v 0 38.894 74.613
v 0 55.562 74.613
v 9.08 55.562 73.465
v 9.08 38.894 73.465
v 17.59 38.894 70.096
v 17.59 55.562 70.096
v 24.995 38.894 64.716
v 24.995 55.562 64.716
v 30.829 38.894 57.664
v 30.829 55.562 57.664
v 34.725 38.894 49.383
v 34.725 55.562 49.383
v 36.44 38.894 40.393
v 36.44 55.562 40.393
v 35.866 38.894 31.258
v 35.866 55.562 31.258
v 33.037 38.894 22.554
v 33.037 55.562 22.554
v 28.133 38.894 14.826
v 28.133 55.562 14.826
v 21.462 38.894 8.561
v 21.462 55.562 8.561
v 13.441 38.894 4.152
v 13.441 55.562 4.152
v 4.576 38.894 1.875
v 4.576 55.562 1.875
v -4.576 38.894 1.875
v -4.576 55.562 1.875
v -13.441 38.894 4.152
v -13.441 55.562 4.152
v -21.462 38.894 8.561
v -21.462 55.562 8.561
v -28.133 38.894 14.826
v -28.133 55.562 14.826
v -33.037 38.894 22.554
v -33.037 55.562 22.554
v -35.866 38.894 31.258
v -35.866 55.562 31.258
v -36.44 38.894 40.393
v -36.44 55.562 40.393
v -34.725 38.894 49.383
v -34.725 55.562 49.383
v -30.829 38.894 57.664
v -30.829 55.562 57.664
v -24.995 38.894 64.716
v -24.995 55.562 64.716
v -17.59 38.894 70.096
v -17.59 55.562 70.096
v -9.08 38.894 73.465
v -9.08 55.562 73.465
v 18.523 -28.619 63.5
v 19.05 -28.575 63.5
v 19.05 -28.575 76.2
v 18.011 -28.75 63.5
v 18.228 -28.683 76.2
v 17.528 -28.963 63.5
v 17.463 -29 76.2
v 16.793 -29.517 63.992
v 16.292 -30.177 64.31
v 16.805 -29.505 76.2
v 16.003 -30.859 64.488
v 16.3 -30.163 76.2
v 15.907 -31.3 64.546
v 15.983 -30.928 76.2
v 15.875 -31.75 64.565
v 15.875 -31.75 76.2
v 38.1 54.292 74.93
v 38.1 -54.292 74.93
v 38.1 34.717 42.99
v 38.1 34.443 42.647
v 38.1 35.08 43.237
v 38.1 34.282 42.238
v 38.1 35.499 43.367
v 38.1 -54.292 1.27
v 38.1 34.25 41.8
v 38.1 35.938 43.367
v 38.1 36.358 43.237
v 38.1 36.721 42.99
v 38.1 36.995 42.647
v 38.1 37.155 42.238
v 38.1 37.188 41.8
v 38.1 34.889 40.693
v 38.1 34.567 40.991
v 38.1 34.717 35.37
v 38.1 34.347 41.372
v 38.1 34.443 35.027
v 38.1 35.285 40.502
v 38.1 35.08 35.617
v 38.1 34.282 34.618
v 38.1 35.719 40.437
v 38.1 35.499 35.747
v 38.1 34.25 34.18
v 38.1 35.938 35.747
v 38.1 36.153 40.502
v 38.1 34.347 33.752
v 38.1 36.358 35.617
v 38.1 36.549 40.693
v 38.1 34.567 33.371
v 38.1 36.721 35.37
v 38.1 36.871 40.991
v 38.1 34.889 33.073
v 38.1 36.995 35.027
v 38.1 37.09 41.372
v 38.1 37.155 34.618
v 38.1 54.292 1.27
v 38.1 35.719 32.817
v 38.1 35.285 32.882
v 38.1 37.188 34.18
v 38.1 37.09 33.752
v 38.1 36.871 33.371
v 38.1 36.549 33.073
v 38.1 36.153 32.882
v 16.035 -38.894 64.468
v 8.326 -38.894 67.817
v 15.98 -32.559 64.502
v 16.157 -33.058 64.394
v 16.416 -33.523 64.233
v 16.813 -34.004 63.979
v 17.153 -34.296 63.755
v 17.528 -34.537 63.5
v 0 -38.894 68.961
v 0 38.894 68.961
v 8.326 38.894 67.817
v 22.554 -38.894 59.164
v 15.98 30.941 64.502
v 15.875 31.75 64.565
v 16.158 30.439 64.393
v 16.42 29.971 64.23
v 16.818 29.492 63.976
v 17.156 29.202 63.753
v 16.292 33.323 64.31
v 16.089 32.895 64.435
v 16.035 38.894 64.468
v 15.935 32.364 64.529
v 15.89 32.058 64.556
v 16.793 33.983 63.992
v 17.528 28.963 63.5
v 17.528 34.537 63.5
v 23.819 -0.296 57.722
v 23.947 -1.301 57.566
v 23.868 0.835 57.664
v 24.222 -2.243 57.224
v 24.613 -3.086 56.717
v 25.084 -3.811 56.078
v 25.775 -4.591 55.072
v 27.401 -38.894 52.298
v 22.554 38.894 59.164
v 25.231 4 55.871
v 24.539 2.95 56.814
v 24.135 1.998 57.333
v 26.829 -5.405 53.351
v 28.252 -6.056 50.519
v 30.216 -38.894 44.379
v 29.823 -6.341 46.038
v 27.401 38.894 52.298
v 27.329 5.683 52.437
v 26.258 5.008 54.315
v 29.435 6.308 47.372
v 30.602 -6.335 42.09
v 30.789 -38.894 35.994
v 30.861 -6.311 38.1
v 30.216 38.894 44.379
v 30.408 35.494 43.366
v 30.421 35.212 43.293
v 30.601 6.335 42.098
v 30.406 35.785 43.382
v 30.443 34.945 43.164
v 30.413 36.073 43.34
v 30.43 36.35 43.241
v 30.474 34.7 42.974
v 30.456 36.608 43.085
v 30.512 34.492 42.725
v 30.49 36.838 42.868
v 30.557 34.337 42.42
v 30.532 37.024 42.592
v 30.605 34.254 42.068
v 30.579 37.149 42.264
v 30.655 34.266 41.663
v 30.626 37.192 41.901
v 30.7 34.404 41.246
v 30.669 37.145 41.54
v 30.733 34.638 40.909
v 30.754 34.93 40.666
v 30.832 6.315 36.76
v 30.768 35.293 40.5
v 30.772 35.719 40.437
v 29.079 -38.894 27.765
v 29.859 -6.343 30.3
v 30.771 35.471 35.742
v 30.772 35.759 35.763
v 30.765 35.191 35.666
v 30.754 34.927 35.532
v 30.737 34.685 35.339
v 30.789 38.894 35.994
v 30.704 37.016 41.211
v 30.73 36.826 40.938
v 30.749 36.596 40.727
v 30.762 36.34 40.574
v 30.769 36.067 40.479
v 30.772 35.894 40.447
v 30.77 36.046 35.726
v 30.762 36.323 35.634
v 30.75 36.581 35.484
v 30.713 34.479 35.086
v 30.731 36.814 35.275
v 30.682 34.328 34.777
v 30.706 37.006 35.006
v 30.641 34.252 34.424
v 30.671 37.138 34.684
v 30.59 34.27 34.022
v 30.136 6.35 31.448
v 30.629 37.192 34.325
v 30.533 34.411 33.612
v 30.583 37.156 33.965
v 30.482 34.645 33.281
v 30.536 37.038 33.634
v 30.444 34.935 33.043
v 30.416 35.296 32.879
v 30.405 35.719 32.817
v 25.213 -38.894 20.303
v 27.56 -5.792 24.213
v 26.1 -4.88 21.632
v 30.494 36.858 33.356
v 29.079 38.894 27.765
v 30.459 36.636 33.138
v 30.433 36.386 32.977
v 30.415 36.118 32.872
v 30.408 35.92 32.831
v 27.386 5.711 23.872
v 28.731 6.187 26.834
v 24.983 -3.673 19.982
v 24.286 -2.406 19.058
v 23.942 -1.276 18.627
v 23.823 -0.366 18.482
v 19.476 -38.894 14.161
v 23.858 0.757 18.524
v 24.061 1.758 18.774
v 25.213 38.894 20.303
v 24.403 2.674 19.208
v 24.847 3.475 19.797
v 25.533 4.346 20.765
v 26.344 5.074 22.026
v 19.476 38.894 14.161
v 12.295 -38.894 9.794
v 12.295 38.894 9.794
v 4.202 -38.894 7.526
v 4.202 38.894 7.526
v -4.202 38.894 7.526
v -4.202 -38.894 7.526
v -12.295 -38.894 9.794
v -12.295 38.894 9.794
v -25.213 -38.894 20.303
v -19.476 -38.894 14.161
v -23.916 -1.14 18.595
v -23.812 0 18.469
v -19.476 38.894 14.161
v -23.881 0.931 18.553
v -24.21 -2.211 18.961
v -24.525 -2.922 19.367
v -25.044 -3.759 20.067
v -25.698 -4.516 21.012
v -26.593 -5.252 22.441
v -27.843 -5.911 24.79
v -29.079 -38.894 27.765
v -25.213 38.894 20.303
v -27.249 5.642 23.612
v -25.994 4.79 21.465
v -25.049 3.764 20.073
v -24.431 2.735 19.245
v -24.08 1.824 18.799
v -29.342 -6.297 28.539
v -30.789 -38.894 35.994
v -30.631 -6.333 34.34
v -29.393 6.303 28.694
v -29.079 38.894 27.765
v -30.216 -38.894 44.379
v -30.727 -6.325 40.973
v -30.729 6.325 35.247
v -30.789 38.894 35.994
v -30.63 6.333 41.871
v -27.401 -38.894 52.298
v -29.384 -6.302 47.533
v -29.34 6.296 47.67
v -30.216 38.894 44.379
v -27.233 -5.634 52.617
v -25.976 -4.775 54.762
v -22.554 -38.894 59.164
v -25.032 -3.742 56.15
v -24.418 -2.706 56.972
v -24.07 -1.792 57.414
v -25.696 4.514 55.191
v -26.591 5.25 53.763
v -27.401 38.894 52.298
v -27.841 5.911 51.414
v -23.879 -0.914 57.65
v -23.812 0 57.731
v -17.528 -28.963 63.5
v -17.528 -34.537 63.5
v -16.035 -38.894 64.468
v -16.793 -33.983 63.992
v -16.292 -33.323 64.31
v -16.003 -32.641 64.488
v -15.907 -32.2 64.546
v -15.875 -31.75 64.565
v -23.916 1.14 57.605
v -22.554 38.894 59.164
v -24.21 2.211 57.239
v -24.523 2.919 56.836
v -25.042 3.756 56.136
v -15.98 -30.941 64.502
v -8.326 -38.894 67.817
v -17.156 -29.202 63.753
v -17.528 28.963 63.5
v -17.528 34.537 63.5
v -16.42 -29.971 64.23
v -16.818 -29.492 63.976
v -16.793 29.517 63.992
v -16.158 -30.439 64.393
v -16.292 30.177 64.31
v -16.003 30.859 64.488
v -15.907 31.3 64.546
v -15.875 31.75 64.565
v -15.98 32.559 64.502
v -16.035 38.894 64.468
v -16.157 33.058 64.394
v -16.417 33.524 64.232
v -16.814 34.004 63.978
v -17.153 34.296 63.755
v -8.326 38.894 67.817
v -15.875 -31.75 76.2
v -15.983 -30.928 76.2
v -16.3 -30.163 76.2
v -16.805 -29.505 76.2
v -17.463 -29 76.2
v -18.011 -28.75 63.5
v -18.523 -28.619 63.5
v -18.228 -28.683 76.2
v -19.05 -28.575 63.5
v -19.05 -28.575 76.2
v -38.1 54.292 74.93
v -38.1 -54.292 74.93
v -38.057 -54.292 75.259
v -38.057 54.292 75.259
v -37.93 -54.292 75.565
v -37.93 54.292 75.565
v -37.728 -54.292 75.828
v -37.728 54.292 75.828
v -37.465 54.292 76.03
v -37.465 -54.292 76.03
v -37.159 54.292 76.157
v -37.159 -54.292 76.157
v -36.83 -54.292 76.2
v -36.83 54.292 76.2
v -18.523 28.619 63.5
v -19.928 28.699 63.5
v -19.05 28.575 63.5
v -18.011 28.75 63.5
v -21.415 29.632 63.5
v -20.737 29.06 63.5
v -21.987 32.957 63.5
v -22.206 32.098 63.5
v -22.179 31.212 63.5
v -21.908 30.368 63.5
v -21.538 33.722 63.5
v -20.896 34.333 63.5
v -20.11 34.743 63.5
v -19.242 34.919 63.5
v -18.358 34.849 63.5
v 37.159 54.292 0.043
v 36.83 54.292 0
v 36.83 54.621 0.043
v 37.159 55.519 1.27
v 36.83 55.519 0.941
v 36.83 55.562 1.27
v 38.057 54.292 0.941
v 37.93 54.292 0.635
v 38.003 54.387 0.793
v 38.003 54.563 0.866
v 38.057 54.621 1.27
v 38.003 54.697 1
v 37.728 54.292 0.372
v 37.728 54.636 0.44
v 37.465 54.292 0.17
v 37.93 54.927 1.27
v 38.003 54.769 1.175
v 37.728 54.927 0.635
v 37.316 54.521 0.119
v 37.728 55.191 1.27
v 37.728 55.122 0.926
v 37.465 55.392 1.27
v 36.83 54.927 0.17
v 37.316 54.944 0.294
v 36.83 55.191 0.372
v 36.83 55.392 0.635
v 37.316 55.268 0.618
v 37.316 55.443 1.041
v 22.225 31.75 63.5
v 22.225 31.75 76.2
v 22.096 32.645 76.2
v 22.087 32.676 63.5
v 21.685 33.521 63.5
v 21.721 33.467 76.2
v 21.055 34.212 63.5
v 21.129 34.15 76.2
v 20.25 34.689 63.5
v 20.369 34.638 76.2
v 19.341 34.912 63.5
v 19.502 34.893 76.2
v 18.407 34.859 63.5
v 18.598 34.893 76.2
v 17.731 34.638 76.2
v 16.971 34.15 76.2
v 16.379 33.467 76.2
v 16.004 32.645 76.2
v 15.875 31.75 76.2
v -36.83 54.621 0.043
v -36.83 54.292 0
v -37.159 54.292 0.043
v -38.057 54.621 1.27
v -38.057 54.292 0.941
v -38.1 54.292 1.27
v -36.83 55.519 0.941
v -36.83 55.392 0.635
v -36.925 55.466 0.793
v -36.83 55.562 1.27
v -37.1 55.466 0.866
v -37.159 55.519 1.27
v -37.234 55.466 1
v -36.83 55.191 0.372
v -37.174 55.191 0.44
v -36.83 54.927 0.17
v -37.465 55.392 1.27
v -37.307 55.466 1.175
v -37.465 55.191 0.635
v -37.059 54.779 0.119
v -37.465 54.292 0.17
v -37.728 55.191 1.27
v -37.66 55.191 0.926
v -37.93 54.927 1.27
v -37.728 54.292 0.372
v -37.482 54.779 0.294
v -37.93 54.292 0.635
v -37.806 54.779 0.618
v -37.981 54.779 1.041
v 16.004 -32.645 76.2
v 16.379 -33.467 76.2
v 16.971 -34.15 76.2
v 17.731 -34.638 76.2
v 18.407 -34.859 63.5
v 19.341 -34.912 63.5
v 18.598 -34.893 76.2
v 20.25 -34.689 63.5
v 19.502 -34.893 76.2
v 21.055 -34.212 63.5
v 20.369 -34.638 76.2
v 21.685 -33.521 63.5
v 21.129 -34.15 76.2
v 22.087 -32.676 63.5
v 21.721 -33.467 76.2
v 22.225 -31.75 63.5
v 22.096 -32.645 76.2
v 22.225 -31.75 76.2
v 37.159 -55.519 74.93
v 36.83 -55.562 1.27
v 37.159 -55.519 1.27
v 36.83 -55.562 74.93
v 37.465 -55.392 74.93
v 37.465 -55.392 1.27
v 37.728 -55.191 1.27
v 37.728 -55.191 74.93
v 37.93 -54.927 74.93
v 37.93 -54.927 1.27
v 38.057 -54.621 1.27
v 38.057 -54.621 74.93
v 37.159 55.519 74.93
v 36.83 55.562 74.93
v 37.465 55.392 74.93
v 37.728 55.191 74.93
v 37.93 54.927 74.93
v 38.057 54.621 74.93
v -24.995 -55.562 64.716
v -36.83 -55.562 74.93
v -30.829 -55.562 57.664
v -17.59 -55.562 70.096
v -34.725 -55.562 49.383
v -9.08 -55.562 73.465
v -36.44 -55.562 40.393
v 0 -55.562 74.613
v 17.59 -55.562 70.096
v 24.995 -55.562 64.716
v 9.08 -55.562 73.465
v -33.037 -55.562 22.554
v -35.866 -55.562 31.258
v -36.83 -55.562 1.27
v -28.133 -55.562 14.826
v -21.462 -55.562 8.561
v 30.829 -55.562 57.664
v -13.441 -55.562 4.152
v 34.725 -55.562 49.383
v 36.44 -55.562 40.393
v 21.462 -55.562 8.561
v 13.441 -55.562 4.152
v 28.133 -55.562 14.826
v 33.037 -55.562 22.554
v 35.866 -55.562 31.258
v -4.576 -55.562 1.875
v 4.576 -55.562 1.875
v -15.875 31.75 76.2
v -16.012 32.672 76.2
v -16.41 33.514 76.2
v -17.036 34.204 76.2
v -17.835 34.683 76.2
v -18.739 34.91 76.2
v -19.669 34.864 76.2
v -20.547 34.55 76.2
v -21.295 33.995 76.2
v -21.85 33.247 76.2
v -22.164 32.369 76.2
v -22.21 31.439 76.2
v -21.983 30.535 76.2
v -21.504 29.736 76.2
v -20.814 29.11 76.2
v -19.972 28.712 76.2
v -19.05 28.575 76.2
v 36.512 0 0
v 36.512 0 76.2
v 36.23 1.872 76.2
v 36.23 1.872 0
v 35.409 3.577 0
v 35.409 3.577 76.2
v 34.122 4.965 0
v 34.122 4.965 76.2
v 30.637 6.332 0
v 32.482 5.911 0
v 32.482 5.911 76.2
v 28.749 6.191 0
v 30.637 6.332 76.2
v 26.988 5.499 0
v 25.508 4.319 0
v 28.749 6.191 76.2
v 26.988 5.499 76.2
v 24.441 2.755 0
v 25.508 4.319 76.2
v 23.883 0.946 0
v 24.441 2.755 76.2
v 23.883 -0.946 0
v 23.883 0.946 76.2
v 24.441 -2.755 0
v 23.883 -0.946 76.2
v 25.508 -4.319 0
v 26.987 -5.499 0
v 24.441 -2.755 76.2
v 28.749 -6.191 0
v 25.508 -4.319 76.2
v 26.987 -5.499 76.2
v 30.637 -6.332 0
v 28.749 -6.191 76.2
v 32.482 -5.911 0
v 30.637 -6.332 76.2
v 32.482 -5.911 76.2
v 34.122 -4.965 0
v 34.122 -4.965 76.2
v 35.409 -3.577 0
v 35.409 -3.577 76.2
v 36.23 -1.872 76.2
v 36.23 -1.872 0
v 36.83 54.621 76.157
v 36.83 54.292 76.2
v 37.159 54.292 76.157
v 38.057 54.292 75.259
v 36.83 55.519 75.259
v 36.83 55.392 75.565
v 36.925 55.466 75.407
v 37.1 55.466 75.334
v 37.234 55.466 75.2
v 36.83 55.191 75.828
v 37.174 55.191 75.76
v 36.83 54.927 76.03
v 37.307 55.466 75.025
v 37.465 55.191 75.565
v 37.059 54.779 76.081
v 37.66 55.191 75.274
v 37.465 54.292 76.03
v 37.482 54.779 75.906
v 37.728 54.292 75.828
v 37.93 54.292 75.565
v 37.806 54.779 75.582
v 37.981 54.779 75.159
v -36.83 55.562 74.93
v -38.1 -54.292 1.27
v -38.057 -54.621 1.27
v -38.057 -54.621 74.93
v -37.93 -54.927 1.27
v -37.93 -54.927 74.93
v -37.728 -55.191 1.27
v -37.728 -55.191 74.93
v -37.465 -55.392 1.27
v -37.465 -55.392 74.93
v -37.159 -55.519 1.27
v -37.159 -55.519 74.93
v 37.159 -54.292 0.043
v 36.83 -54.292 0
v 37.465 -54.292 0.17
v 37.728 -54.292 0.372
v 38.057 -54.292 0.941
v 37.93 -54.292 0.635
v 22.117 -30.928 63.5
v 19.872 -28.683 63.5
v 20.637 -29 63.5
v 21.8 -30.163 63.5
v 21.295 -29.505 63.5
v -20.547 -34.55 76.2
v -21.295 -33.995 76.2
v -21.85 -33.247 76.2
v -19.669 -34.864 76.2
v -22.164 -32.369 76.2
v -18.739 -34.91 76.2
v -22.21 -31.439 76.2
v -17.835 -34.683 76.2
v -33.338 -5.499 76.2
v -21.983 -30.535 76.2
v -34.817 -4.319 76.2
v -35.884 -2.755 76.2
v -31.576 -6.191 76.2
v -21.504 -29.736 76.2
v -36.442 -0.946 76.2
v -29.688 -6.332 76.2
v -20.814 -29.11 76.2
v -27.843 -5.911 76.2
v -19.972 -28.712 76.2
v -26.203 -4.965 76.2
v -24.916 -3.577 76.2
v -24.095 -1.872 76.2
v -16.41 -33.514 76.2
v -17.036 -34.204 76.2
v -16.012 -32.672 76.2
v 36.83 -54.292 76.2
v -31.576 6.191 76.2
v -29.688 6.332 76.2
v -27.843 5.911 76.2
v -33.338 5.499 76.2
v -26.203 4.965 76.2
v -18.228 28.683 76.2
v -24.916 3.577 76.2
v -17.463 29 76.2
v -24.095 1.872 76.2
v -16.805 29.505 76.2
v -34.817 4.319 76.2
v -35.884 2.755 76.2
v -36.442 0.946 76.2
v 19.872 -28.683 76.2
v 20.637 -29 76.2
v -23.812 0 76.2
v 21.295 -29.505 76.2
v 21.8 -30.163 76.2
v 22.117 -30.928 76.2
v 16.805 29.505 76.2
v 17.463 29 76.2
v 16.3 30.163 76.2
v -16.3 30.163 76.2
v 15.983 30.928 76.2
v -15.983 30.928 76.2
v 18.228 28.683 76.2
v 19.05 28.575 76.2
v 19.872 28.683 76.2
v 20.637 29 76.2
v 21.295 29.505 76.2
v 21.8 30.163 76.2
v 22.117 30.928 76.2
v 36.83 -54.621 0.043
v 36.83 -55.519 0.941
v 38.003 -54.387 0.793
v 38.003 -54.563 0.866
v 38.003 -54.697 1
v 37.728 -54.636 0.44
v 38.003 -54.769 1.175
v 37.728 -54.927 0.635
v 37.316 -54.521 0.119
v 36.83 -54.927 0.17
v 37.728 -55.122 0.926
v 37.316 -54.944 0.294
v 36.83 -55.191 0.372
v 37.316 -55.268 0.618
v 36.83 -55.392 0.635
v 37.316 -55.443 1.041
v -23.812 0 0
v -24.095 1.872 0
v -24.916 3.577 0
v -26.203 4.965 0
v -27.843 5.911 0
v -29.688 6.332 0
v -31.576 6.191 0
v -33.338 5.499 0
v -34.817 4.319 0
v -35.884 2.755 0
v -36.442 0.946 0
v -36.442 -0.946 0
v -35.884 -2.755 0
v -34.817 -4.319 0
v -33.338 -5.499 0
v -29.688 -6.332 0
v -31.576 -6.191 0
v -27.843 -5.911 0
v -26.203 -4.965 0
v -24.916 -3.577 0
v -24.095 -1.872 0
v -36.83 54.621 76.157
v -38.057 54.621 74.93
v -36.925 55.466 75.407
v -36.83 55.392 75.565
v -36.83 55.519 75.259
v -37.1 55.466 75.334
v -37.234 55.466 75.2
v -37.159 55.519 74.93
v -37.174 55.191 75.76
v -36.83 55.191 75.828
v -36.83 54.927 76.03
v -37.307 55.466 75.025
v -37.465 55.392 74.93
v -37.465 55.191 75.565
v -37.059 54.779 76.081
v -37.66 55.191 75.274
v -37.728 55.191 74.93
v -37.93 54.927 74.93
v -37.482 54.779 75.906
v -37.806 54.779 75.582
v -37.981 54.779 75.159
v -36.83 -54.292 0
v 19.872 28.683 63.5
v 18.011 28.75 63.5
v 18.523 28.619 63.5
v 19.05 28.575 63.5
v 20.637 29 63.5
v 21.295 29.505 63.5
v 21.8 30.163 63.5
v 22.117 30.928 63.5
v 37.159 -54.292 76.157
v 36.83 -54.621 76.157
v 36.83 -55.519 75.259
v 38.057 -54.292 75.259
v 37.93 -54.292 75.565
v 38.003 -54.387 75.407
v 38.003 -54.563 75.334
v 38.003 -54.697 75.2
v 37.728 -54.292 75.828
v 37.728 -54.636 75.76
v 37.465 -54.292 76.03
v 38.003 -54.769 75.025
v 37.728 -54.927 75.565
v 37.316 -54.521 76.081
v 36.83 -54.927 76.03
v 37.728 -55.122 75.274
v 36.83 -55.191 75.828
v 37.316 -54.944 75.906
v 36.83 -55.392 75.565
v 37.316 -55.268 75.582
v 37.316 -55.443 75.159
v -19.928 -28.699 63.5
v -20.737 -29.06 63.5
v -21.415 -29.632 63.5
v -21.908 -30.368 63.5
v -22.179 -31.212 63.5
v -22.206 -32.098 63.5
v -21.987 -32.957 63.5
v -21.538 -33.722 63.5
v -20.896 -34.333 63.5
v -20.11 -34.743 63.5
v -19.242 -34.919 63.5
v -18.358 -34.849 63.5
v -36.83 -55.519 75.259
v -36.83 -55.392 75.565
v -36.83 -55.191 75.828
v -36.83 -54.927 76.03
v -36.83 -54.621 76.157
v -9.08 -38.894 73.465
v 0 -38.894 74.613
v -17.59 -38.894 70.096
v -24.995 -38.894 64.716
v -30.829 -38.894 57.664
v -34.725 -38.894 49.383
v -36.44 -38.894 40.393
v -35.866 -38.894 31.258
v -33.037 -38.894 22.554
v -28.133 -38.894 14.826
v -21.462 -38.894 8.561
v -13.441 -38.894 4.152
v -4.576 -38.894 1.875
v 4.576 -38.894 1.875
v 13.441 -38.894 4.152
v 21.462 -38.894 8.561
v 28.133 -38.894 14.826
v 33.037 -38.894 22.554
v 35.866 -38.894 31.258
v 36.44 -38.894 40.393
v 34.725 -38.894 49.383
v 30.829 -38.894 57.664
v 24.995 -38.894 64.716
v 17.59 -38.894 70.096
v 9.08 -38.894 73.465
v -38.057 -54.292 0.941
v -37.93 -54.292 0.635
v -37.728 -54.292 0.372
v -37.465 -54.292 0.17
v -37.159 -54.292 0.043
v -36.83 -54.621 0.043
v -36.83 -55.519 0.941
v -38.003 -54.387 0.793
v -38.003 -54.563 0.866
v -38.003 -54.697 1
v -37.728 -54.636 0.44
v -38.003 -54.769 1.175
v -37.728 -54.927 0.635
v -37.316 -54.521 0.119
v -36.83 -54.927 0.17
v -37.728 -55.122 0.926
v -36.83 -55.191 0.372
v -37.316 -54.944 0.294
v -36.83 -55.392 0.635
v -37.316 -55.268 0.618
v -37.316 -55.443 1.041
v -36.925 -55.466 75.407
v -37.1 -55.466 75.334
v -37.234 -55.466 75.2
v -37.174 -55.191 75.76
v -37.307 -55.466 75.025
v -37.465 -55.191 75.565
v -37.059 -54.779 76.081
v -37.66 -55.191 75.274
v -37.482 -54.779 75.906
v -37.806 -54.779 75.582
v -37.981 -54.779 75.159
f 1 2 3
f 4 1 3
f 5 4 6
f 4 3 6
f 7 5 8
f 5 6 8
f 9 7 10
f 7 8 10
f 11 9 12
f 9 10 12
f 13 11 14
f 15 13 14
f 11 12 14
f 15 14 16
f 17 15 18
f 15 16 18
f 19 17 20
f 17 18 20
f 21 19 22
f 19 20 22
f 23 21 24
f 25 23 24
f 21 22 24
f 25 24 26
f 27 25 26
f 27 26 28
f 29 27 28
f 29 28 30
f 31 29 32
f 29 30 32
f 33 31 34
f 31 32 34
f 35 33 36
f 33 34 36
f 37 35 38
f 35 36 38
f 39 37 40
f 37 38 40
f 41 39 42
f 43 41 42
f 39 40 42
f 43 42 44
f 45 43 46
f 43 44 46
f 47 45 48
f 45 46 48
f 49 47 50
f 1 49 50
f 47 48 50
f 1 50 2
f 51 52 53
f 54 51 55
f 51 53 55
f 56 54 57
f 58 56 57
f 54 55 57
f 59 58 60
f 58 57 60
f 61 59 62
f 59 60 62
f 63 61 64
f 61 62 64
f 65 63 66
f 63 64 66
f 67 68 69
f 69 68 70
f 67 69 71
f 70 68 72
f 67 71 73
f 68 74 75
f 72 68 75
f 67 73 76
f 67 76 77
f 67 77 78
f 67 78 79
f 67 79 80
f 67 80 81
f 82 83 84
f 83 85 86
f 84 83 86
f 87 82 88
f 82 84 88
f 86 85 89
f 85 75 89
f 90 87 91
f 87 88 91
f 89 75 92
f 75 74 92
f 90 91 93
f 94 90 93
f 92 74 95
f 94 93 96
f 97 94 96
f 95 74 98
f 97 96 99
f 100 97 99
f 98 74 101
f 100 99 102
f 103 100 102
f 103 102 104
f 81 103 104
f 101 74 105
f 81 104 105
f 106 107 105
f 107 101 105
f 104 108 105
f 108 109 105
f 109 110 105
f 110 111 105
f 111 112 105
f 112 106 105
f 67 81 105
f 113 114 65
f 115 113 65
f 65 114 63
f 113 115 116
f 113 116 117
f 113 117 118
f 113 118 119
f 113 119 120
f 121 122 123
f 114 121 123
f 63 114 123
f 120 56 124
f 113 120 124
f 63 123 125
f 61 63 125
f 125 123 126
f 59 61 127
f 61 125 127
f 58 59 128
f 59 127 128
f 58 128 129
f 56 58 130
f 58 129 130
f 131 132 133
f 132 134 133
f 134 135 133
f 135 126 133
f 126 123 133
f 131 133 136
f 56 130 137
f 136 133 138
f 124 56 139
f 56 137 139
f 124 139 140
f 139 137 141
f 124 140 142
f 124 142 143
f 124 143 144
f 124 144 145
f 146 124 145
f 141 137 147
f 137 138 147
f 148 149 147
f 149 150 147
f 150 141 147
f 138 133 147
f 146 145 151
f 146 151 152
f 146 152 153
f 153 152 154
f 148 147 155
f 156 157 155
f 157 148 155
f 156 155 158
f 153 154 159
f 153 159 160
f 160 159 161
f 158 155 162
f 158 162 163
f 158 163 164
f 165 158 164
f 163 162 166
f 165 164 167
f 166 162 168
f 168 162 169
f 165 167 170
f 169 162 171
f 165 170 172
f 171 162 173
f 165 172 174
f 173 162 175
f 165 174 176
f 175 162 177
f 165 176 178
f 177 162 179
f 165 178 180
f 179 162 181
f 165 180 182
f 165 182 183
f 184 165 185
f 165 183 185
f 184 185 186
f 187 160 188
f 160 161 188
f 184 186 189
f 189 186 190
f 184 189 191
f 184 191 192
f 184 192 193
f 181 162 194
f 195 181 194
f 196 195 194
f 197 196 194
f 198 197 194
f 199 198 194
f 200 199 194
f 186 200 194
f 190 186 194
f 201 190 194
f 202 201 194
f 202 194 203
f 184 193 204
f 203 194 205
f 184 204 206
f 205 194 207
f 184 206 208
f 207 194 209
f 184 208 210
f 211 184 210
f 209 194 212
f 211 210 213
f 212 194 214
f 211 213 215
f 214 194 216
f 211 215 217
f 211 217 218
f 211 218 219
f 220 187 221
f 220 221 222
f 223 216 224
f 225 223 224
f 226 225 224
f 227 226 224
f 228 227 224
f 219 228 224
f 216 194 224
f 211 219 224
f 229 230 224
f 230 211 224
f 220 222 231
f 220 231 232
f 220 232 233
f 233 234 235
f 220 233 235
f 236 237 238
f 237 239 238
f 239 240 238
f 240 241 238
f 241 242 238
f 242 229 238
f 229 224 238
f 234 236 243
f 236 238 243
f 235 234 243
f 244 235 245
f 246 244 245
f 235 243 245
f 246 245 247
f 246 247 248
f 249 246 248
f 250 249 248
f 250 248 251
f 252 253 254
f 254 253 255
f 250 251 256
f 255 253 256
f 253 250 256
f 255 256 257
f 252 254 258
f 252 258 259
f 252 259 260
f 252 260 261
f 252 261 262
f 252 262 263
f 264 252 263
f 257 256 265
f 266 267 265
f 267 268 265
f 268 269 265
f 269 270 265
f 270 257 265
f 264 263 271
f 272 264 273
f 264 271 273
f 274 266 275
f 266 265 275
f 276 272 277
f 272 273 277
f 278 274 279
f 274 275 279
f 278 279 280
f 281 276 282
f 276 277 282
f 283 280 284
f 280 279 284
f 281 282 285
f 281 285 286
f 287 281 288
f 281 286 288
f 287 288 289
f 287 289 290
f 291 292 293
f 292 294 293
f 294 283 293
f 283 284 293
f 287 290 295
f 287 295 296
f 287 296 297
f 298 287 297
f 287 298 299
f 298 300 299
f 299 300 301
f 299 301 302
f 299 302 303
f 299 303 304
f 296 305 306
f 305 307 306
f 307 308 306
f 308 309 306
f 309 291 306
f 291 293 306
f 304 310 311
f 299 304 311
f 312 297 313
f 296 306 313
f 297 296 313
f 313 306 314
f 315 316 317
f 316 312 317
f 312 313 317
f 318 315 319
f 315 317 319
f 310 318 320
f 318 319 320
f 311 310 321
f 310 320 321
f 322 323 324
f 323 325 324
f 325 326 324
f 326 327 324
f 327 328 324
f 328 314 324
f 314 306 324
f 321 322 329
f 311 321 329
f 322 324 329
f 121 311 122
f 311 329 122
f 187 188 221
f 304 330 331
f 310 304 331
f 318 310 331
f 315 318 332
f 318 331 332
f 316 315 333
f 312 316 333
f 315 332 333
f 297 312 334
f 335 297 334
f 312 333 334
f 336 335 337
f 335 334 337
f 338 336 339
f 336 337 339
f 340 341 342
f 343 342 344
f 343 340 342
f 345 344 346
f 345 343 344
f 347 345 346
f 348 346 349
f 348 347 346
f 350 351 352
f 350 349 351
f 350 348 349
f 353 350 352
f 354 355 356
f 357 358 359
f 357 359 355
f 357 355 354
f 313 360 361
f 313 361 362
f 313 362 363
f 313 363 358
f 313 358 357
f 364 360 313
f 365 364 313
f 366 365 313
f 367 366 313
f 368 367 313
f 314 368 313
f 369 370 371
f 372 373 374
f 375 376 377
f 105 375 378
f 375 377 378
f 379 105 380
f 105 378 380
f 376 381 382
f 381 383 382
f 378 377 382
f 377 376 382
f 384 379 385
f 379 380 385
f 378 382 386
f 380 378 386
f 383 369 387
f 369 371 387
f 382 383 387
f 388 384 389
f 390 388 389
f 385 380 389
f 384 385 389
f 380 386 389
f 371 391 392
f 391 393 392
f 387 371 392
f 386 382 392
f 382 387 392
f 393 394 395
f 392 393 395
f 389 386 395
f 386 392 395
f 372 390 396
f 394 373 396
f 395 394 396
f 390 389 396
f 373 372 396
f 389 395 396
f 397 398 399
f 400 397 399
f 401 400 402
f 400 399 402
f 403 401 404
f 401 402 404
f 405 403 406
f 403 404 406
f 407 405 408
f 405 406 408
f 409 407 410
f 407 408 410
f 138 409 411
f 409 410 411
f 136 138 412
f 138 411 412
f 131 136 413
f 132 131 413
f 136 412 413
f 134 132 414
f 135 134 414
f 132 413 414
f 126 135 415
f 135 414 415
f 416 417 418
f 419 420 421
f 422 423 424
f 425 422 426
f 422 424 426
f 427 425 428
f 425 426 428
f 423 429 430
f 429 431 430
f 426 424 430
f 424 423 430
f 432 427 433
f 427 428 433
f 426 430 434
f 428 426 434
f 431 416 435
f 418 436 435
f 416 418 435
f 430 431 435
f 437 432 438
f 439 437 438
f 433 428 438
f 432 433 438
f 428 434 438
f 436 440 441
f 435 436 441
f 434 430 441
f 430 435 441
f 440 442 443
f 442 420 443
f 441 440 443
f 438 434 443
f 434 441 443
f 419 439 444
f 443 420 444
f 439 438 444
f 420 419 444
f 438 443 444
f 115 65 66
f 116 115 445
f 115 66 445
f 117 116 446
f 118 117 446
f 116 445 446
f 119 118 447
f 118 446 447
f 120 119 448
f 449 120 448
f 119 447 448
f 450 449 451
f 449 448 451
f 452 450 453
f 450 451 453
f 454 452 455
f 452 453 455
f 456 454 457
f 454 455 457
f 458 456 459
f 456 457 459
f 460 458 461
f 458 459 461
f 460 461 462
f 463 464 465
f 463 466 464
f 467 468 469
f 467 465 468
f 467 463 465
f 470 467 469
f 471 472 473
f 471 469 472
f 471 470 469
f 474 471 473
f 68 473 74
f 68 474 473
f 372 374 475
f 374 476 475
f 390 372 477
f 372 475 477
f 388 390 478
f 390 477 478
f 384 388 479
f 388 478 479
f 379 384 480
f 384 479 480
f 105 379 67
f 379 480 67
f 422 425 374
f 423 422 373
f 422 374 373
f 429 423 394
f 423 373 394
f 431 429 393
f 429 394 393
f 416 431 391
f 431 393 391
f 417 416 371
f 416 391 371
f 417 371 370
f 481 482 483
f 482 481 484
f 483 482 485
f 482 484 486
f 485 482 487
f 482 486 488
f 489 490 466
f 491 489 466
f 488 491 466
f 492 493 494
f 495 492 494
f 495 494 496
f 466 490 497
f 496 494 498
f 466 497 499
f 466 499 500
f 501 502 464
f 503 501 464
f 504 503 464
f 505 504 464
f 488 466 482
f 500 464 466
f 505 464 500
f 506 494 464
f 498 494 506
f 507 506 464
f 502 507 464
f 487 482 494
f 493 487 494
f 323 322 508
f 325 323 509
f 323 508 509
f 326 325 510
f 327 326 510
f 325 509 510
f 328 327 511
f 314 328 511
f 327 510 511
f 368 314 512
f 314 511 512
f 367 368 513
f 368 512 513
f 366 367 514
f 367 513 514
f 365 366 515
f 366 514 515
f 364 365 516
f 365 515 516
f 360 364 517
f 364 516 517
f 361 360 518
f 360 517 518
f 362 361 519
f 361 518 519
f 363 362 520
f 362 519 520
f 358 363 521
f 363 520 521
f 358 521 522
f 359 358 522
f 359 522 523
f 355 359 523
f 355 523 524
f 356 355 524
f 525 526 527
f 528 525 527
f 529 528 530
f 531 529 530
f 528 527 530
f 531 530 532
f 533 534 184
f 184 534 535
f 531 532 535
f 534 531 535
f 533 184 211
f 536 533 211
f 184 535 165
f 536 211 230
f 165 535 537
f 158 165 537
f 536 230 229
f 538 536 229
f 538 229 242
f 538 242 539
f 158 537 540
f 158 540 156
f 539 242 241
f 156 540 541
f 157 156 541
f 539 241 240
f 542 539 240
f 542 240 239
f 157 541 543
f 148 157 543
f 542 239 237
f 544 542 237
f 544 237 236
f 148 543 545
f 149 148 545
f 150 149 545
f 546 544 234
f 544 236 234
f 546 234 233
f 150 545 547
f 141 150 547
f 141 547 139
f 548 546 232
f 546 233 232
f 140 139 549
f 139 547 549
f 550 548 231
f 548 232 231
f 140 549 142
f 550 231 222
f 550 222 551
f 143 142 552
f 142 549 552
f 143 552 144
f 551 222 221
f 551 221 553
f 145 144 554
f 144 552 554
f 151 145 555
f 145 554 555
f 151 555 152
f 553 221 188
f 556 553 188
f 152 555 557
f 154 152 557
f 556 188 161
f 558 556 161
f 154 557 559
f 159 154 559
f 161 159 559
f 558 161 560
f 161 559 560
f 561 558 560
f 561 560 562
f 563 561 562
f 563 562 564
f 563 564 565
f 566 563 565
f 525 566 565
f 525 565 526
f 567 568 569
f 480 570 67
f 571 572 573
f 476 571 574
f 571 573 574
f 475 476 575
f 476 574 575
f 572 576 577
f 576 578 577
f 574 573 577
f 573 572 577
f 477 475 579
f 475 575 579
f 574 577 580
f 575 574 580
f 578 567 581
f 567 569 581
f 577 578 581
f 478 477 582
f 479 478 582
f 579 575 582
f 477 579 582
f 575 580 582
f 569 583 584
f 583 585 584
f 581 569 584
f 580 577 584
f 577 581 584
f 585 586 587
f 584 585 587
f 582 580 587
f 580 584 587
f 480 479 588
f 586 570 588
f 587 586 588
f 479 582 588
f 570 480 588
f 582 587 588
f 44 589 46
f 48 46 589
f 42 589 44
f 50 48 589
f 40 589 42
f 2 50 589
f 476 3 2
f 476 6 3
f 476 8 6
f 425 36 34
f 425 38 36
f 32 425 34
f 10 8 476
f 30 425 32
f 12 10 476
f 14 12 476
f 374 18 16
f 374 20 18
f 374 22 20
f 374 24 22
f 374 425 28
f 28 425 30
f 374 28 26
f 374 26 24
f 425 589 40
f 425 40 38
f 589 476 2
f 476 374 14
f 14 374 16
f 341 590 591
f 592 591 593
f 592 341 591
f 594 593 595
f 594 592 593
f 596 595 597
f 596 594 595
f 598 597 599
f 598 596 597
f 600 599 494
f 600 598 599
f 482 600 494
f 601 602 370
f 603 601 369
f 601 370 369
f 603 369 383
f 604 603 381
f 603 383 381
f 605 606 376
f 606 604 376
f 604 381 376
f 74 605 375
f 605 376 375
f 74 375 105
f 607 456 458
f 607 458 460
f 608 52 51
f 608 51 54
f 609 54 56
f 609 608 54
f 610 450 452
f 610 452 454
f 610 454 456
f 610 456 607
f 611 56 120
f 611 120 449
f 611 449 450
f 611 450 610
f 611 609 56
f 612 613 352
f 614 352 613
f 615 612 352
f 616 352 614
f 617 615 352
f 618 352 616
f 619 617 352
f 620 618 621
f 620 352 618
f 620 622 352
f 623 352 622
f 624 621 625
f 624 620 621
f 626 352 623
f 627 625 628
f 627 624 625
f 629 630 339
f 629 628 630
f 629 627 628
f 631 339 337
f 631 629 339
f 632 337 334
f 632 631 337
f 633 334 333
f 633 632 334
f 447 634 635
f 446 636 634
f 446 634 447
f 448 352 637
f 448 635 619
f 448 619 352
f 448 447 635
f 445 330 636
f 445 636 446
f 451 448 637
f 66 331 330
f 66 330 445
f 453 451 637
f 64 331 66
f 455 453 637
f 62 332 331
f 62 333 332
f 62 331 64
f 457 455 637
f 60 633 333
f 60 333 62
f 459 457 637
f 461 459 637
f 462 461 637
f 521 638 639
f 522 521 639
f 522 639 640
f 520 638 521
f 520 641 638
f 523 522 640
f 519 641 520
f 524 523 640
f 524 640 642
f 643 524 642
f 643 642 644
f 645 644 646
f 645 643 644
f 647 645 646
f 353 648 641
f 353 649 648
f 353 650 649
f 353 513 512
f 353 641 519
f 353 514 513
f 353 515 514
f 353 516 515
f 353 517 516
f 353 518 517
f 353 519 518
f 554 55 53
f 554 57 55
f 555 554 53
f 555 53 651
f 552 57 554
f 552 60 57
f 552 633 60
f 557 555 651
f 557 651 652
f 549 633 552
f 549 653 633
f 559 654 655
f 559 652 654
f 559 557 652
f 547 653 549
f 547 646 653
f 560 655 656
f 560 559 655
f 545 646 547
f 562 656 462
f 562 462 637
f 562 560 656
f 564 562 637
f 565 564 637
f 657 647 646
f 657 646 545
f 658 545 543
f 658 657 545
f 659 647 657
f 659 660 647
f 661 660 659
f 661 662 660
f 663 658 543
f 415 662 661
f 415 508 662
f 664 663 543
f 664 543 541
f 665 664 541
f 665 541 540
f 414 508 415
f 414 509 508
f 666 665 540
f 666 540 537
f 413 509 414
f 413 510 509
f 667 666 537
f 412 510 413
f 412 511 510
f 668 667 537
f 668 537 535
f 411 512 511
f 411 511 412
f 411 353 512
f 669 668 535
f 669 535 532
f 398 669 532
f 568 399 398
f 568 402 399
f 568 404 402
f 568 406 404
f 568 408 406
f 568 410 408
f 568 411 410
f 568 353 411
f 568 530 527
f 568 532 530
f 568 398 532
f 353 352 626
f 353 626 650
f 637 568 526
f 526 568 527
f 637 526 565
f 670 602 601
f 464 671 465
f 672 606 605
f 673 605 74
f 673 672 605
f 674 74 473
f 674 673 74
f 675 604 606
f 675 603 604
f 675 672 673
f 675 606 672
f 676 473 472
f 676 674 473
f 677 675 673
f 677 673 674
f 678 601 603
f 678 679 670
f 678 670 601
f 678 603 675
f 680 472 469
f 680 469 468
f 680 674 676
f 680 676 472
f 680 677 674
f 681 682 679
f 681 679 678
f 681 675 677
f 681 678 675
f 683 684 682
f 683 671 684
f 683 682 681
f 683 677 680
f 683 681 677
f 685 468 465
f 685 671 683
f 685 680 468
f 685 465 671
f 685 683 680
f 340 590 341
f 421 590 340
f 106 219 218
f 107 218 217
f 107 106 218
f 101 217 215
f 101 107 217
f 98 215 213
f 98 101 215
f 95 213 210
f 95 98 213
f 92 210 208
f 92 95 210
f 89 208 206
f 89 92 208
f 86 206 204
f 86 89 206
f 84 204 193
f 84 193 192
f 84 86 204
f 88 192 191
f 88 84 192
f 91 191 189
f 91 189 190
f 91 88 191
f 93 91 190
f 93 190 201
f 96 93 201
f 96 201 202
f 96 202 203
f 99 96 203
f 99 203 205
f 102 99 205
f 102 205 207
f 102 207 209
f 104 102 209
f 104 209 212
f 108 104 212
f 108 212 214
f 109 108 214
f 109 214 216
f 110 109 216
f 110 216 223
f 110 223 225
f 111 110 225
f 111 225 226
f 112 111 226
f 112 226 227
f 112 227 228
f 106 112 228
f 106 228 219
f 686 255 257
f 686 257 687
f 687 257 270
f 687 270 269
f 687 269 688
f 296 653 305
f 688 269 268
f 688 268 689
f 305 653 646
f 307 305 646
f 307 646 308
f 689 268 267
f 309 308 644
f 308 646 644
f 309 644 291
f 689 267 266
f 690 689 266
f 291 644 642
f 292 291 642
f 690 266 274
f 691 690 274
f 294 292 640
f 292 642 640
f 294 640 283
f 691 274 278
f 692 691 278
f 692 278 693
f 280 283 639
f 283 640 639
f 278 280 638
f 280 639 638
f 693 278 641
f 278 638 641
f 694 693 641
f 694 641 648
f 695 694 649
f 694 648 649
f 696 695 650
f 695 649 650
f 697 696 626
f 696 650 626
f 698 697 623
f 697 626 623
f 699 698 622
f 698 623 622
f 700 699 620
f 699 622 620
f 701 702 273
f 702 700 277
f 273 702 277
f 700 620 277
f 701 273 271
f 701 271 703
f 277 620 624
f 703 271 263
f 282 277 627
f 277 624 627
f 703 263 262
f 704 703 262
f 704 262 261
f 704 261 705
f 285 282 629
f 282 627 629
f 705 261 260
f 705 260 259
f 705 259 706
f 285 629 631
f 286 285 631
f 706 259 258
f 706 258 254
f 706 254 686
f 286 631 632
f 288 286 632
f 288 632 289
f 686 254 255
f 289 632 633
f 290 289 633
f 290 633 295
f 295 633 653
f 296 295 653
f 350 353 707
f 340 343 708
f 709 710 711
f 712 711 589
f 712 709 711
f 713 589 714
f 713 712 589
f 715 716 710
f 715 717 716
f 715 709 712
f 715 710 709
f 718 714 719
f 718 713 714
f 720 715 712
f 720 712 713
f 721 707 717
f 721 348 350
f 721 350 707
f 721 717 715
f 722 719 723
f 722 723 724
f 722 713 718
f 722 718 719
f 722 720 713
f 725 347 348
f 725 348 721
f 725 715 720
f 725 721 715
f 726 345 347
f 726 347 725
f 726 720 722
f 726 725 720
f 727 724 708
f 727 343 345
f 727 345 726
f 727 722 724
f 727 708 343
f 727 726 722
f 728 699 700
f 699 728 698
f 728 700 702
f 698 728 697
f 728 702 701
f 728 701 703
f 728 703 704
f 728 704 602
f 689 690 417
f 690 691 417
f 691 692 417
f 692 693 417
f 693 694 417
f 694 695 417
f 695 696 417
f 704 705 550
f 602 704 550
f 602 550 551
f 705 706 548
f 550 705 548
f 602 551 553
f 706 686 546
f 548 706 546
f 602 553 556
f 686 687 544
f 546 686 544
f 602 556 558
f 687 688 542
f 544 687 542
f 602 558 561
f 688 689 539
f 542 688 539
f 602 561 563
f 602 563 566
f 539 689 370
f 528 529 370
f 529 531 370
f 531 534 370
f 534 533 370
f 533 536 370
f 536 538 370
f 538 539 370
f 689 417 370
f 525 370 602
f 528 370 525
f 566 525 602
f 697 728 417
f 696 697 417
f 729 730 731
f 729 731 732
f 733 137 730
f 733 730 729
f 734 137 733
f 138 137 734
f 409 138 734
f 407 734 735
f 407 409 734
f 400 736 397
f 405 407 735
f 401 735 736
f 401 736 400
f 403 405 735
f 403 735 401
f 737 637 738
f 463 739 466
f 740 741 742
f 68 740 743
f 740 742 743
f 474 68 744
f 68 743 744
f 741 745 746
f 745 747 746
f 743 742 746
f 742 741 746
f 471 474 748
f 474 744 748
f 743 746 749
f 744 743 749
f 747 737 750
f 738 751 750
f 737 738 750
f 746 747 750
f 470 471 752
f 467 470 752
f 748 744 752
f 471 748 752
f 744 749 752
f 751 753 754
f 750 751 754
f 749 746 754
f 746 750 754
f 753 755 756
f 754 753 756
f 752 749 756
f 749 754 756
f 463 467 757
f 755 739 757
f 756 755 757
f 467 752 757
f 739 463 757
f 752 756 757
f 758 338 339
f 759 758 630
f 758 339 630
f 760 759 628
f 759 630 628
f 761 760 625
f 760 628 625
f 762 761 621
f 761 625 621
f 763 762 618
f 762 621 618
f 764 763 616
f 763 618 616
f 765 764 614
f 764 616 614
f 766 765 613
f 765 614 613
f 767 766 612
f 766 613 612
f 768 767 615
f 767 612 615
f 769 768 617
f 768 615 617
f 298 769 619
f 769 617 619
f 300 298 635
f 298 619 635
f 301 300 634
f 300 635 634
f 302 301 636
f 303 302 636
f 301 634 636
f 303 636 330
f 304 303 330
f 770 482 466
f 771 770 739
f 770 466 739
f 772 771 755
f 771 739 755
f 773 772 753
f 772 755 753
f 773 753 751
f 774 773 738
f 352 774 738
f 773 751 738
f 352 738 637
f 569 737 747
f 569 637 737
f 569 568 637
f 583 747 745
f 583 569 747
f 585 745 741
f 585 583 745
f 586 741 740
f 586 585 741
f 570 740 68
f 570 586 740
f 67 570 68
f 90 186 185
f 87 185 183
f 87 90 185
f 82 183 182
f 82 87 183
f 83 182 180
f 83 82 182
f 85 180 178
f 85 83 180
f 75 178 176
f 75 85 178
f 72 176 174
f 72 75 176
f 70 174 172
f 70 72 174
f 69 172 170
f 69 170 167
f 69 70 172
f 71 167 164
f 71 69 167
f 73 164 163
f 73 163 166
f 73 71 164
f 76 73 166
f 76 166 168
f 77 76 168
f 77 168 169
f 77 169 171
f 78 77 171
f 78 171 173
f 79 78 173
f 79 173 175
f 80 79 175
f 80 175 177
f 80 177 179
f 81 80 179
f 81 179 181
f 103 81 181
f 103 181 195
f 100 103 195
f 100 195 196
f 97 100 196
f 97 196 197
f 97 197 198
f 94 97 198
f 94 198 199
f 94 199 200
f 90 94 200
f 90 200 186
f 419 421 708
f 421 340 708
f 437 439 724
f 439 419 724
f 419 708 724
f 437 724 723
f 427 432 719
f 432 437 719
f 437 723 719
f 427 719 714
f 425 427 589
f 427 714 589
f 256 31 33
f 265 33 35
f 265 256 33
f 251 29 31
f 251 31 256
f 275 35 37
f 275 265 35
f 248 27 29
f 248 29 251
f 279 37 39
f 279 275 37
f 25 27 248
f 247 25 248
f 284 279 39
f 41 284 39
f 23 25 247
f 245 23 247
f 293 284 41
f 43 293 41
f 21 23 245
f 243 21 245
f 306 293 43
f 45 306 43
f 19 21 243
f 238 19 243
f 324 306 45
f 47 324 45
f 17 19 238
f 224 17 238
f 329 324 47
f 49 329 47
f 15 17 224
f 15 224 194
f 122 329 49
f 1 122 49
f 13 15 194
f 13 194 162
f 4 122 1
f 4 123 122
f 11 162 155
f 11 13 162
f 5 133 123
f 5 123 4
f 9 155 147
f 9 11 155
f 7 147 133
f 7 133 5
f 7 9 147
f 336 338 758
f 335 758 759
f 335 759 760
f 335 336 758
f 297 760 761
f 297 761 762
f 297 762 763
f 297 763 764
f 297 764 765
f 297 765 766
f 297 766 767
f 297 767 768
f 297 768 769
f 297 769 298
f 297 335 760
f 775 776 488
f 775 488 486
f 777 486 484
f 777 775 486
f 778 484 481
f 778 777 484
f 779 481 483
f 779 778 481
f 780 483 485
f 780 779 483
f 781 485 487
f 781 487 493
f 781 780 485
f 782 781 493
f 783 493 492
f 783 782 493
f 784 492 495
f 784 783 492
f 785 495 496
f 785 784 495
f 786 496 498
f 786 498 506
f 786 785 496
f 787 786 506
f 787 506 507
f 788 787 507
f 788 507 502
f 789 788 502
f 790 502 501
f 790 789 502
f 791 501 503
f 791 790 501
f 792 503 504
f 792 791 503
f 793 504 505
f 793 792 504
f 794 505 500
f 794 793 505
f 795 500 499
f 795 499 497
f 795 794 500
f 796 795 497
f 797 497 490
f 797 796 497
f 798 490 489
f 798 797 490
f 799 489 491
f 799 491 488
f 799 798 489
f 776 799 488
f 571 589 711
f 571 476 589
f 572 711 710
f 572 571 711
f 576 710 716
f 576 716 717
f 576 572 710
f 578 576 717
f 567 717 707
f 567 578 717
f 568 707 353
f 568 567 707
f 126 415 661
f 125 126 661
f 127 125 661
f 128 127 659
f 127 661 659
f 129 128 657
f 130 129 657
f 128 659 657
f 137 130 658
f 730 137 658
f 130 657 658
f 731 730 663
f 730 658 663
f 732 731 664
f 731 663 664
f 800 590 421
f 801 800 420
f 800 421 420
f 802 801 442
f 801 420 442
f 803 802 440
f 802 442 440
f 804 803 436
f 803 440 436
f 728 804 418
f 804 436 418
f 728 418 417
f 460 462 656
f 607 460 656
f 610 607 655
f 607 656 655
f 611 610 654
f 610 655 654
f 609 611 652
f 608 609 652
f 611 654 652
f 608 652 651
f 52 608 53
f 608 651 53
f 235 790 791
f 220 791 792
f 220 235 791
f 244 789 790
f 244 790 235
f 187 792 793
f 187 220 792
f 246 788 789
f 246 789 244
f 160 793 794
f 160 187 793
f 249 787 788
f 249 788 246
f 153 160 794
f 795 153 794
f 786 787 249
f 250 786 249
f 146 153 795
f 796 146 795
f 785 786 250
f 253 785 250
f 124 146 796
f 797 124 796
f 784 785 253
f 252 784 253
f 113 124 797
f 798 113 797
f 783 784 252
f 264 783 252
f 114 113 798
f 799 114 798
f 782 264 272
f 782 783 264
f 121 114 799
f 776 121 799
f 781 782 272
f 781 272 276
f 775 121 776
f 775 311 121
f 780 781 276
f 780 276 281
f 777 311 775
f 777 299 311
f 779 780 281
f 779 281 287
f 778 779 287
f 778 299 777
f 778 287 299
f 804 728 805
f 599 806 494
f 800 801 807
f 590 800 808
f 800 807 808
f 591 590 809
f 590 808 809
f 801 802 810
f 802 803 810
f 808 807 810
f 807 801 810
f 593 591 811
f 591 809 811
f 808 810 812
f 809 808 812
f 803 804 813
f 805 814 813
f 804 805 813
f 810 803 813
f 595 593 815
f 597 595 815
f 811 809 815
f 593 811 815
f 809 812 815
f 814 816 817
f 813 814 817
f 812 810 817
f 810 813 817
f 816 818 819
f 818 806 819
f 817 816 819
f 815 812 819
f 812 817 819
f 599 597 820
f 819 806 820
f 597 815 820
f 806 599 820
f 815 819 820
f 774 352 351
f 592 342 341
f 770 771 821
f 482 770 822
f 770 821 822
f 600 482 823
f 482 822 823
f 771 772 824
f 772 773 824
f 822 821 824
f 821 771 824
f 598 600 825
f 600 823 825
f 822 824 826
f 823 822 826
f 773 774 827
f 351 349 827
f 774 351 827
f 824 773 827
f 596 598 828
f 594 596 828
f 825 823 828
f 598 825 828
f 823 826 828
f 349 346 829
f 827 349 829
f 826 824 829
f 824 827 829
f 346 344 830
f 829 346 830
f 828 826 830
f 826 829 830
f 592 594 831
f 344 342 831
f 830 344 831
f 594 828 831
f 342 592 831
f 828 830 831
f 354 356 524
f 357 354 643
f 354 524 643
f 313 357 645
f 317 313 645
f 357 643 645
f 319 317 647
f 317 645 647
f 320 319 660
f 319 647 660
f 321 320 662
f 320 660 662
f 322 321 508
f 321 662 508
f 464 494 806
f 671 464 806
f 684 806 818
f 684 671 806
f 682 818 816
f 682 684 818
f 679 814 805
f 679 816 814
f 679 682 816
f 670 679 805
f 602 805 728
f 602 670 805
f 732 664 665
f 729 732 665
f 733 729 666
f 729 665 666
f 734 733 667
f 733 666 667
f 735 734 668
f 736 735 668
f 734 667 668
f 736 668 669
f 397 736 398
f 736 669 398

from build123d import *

# Parameters (mm, degrees)
SKETCH1_W           = 76.2
SKETCH1_H           = 111.125
BOSS_EXTRUDE1_DEPTH = 76.2
SKETCH2_R           = 30.861
CUT_EXTRUDE1_DEPTH  = 127
SKETCH3_R           = 36.5125
CUT_EXTRUDE2_DEPTH  = 16.66875
CUT_EXTRUDE3_START  = -16.66875
SKETCH4_R           = 36.5125
CUT_EXTRUDE3_DEPTH  = 16.66875
SKETCH5_R           = 6.35
CUT_EXTRUDE4_DEPTH  = 102.711559846
CUT_EXTRUDE5_DEPTH  = 12.7
FILLET1_R           = 1.27
SKETCH8_R           = 1.4732
CUT_EXTRUDE6_DEPTH  = 23.622


with BuildPart() as part:
    # Sketch1 → Boss-Extrude1 (new body)
    with BuildSketch(Plane.XY):
        Rectangle(SKETCH1_W, SKETCH1_H)
    extrude(amount=BOSS_EXTRUDE1_DEPTH)

    # Sketch2 → Cut-Extrude1 (cut)
    with BuildSketch(Plane(origin=(0, 55.5625, 0), x_dir=(1, 0, 0), z_dir=(0, 1, 0))):
        with Locations(Location((0, -38.1, 0), (0, 0, 270))):
            Circle(SKETCH2_R)
    extrude(amount=-CUT_EXTRUDE1_DEPTH, mode=Mode.SUBTRACT)

    # Sketch3 → Cut-Extrude2 (cut)
    with BuildSketch(Plane(origin=(0, 55.5625, 0), x_dir=(1, 0, 0), z_dir=(0, 1, 0))):
        with Locations(Location((0, -38.1, 0), (0, 0, 270))):
            Circle(SKETCH3_R)
    extrude(amount=-CUT_EXTRUDE2_DEPTH, mode=Mode.SUBTRACT)

    # Sketch4 → Cut-Extrude3 (cut)
    with BuildSketch(Plane.XZ.offset(55.5625).offset(CUT_EXTRUDE3_START)):
        with Locations(Location((0, 38.1, 0), (0, 0, 90))):
            Circle(SKETCH4_R)
    extrude(amount=CUT_EXTRUDE3_DEPTH, mode=Mode.SUBTRACT)

    # Sketch5 → Cut-Extrude4 (cut, through all)
    with BuildSketch(Plane.XY.offset(76.2)):
        with Locations((-30.1625, 0)):
            Circle(SKETCH5_R)
        with Locations((30.1625, 0)):
            Circle(SKETCH5_R)
    extrude(amount=-CUT_EXTRUDE4_DEPTH, mode=Mode.SUBTRACT)

    # Sketch6 → Cut-Extrude5 (cut)
    with BuildSketch(Plane.XY.offset(76.2)):
        with BuildLine():
            ThreePointArc((-15.875, 31.75), (-21.29506403, 33.99506403), (-19.05, 28.575))
            Line((-19.05, 28.575), (-19.05, 31.75))
            Line((-19.05, 31.75), (-15.875, 31.75))
        make_face()
        with BuildLine():
            Line((-19.05, 31.75), (-19.05, 28.575))
            ThreePointArc((-19.05, 28.575), (-16.80493597, 29.50493597), (-15.875, 31.75))
            Line((-15.875, 31.75), (-19.05, 31.75))
        make_face()
        with BuildLine():
            ThreePointArc((15.875, 31.75), (16.80493597, 29.50493597), (19.05, 28.575))
            Line((19.05, 28.575), (19.05, 31.75))
            Line((19.05, 31.75), (15.875, 31.75))
        make_face()
        with BuildLine():
            Line((19.05, 31.75), (19.05, 28.575))
            ThreePointArc((19.05, 28.575), (21.29506403, 29.50493597), (22.225, 31.75))
            ThreePointArc((22.225, 31.75), (19.05, 34.925), (15.875, 31.75))
            Line((15.875, 31.75), (19.05, 31.75))
        make_face()
        with BuildLine():
            ThreePointArc((-19.05, -28.575), (-21.29506403, -33.99506403), (-15.875, -31.75))
            Line((-15.875, -31.75), (-19.05, -31.75))
            Line((-19.05, -31.75), (-19.05, -28.575))
        make_face()
        with BuildLine():
            Line((-19.05, -31.75), (-15.875, -31.75))
            ThreePointArc((-15.875, -31.75), (-16.80493597, -29.50493597), (-19.05, -28.575))
            Line((-19.05, -28.575), (-19.05, -31.75))
        make_face()
        with BuildLine():
            ThreePointArc((19.05, -28.575), (16.80493597, -29.50493597), (15.875, -31.75))
            Line((15.875, -31.75), (19.05, -31.75))
            Line((19.05, -31.75), (19.05, -28.575))
        make_face()
        with BuildLine():
            Line((19.05, -31.75), (15.875, -31.75))
            ThreePointArc((15.875, -31.75), (19.05, -34.925), (22.225, -31.75))
            ThreePointArc((22.225, -31.75), (21.29506403, -29.50493597), (19.05, -28.575))
            Line((19.05, -28.575), (19.05, -31.75))
        make_face()
    extrude(amount=-CUT_EXTRUDE5_DEPTH, mode=Mode.SUBTRACT)

    # Fillet1
    fillet1_edges = [part.edges().sort_by_distance(p)[0] for p in [
        (-38.1, 0, 76.2),
        (0, -55.5625, 76.2),
        (38.1, 0, 76.2),
        (0, -55.5625, 0),
        (-38.1, 0, 0),
        (0, 55.5625, 0),
        (38.1, 0, 0),
        (0, 55.5625, 76.2),
        (38.1, -55.5625, 38.1),
        (-38.1, -55.5625, 38.1),
        (-38.1, 55.5625, 38.1),
        (38.1, 55.5625, 38.1),
    ]]
    fillet(fillet1_edges, radius=FILLET1_R)

    # Sketch8 → Cut-Extrude6 (cut)
    with BuildSketch(Plane.ZY.offset(-38.1)):
        with Locations(Location((34.29, 35.71875, 0), (0, 0, 180))):
            Circle(SKETCH8_R)
        with Locations(Location((41.91, 35.71875, 0), (0, 0, 180))):
            Circle(SKETCH8_R)
    extrude(amount=CUT_EXTRUDE6_DEPTH, mode=Mode.SUBTRACT)


solid = part.part
